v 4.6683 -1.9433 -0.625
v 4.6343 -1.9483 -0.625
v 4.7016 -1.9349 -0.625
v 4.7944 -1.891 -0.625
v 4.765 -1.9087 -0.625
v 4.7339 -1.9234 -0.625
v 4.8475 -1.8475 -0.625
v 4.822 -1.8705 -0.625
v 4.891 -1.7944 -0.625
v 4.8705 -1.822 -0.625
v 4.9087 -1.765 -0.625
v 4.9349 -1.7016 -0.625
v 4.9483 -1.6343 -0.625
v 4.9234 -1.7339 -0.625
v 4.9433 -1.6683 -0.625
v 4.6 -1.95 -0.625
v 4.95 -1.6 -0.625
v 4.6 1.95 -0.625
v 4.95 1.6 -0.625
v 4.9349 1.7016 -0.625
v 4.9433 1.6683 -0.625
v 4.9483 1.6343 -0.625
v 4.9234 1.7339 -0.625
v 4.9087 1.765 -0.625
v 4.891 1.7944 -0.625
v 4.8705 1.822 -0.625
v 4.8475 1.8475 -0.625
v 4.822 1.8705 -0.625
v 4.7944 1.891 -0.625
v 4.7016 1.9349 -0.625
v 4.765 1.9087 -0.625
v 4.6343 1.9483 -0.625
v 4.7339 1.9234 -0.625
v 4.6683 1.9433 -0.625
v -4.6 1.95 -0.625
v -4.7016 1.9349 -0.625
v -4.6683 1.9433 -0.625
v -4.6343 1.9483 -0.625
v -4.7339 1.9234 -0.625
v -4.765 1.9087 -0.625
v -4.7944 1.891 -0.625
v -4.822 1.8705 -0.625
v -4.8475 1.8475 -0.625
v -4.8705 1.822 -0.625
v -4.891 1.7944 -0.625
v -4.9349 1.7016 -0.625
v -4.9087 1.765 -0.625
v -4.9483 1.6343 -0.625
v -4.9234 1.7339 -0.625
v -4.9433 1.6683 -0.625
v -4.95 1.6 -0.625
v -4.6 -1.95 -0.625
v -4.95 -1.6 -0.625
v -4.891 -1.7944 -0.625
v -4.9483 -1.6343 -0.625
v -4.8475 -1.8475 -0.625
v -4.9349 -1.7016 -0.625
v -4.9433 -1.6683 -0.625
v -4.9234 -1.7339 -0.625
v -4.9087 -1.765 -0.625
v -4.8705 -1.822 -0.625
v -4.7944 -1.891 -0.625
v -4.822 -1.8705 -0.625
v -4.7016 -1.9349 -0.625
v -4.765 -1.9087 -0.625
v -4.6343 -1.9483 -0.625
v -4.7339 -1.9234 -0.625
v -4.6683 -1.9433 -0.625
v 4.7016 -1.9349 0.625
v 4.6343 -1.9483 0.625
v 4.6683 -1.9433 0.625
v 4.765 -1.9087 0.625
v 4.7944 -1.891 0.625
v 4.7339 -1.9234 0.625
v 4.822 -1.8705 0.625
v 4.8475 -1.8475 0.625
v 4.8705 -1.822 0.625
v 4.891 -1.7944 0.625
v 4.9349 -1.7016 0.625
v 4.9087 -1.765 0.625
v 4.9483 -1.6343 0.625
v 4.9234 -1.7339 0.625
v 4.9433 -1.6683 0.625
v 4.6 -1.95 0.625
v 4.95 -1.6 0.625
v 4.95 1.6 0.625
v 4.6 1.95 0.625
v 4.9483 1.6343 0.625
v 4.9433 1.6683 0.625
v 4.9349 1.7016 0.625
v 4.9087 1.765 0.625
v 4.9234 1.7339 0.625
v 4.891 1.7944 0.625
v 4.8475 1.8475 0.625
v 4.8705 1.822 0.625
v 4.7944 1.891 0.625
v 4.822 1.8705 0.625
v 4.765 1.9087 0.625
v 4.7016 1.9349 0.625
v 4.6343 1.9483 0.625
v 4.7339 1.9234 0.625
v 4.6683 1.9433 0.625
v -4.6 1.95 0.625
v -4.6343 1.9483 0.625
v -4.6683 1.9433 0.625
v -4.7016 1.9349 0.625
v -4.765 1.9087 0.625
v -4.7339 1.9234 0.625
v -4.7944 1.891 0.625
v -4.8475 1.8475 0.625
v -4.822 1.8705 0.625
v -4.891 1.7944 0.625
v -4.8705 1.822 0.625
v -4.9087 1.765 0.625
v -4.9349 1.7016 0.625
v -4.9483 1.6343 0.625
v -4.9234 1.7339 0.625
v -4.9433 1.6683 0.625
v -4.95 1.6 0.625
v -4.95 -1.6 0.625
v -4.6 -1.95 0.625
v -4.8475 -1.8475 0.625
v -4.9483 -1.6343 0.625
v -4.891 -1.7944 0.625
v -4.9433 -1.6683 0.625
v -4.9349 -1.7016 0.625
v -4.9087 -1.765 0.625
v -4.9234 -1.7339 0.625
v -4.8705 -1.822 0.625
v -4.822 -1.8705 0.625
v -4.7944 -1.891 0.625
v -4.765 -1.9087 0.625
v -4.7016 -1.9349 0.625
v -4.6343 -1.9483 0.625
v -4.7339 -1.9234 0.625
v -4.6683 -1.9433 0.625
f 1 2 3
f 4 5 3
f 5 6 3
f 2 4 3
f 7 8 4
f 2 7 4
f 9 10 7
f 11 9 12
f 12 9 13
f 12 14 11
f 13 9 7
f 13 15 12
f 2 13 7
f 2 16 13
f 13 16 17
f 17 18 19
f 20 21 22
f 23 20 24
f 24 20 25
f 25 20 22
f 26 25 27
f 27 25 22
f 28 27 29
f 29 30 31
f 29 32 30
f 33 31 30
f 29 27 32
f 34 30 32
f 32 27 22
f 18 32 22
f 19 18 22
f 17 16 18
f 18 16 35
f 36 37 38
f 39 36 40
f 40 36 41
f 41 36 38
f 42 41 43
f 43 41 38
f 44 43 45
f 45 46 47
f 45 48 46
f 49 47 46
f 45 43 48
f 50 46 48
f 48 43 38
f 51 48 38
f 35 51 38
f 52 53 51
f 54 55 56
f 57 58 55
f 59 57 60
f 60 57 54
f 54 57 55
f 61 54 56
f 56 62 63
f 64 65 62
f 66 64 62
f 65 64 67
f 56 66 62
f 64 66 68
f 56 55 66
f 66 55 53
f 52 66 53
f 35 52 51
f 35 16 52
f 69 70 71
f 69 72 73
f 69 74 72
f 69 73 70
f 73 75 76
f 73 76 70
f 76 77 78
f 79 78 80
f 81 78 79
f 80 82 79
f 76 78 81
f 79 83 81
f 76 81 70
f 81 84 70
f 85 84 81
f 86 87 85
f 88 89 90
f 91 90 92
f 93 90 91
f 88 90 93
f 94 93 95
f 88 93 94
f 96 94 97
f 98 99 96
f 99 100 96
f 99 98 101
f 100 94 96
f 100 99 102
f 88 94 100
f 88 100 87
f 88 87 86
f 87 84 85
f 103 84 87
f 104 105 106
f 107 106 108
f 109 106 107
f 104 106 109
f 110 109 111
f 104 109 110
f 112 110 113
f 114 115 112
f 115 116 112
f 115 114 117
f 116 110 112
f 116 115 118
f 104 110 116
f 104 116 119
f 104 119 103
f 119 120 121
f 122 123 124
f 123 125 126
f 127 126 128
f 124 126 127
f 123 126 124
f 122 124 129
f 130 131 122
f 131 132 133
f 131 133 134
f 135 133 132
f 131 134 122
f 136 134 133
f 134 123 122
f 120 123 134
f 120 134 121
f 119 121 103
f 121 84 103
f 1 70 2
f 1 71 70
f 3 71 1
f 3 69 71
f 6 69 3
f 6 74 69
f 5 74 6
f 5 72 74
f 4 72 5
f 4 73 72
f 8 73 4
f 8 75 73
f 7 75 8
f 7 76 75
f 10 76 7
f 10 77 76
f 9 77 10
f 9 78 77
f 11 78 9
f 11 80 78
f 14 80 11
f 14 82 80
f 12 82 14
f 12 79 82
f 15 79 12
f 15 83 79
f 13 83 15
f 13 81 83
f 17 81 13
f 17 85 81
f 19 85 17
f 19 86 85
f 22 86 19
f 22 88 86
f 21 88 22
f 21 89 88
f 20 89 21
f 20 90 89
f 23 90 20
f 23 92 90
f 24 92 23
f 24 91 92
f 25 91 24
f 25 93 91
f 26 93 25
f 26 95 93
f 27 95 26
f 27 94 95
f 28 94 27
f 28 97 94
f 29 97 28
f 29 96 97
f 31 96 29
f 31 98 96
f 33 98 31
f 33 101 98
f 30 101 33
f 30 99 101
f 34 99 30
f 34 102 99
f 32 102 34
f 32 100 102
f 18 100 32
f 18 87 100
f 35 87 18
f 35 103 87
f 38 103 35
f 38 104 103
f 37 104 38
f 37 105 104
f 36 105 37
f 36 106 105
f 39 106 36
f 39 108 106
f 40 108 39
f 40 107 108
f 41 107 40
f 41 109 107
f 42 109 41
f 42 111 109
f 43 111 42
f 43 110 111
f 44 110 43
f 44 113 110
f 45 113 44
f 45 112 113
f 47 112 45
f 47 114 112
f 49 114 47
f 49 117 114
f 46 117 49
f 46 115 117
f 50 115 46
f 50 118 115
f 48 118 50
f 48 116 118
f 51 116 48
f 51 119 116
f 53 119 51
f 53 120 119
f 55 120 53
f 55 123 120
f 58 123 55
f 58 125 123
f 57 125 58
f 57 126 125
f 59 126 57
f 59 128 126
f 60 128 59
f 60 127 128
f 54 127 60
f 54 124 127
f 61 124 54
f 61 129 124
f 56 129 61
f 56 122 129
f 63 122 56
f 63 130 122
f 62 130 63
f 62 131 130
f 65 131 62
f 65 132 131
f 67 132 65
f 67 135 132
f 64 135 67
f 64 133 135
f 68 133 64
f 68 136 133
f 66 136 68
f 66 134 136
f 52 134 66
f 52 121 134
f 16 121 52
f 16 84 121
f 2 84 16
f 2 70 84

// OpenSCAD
$fn=64;

module smd_body(size=[9.90, 3.90, 1.25], corner_r=0.35) {
    x=size[0]; y=size[1]; z=size[2];
    r=min(corner_r, x/2, y/2);
    translate([0,0,0])
    linear_extrude(height=z, center=true)
        offset(r=r)
            square([x-2*r, y-2*r], center=true);
}

smd_body([9.90, 3.90, 1.25], 0.35);
